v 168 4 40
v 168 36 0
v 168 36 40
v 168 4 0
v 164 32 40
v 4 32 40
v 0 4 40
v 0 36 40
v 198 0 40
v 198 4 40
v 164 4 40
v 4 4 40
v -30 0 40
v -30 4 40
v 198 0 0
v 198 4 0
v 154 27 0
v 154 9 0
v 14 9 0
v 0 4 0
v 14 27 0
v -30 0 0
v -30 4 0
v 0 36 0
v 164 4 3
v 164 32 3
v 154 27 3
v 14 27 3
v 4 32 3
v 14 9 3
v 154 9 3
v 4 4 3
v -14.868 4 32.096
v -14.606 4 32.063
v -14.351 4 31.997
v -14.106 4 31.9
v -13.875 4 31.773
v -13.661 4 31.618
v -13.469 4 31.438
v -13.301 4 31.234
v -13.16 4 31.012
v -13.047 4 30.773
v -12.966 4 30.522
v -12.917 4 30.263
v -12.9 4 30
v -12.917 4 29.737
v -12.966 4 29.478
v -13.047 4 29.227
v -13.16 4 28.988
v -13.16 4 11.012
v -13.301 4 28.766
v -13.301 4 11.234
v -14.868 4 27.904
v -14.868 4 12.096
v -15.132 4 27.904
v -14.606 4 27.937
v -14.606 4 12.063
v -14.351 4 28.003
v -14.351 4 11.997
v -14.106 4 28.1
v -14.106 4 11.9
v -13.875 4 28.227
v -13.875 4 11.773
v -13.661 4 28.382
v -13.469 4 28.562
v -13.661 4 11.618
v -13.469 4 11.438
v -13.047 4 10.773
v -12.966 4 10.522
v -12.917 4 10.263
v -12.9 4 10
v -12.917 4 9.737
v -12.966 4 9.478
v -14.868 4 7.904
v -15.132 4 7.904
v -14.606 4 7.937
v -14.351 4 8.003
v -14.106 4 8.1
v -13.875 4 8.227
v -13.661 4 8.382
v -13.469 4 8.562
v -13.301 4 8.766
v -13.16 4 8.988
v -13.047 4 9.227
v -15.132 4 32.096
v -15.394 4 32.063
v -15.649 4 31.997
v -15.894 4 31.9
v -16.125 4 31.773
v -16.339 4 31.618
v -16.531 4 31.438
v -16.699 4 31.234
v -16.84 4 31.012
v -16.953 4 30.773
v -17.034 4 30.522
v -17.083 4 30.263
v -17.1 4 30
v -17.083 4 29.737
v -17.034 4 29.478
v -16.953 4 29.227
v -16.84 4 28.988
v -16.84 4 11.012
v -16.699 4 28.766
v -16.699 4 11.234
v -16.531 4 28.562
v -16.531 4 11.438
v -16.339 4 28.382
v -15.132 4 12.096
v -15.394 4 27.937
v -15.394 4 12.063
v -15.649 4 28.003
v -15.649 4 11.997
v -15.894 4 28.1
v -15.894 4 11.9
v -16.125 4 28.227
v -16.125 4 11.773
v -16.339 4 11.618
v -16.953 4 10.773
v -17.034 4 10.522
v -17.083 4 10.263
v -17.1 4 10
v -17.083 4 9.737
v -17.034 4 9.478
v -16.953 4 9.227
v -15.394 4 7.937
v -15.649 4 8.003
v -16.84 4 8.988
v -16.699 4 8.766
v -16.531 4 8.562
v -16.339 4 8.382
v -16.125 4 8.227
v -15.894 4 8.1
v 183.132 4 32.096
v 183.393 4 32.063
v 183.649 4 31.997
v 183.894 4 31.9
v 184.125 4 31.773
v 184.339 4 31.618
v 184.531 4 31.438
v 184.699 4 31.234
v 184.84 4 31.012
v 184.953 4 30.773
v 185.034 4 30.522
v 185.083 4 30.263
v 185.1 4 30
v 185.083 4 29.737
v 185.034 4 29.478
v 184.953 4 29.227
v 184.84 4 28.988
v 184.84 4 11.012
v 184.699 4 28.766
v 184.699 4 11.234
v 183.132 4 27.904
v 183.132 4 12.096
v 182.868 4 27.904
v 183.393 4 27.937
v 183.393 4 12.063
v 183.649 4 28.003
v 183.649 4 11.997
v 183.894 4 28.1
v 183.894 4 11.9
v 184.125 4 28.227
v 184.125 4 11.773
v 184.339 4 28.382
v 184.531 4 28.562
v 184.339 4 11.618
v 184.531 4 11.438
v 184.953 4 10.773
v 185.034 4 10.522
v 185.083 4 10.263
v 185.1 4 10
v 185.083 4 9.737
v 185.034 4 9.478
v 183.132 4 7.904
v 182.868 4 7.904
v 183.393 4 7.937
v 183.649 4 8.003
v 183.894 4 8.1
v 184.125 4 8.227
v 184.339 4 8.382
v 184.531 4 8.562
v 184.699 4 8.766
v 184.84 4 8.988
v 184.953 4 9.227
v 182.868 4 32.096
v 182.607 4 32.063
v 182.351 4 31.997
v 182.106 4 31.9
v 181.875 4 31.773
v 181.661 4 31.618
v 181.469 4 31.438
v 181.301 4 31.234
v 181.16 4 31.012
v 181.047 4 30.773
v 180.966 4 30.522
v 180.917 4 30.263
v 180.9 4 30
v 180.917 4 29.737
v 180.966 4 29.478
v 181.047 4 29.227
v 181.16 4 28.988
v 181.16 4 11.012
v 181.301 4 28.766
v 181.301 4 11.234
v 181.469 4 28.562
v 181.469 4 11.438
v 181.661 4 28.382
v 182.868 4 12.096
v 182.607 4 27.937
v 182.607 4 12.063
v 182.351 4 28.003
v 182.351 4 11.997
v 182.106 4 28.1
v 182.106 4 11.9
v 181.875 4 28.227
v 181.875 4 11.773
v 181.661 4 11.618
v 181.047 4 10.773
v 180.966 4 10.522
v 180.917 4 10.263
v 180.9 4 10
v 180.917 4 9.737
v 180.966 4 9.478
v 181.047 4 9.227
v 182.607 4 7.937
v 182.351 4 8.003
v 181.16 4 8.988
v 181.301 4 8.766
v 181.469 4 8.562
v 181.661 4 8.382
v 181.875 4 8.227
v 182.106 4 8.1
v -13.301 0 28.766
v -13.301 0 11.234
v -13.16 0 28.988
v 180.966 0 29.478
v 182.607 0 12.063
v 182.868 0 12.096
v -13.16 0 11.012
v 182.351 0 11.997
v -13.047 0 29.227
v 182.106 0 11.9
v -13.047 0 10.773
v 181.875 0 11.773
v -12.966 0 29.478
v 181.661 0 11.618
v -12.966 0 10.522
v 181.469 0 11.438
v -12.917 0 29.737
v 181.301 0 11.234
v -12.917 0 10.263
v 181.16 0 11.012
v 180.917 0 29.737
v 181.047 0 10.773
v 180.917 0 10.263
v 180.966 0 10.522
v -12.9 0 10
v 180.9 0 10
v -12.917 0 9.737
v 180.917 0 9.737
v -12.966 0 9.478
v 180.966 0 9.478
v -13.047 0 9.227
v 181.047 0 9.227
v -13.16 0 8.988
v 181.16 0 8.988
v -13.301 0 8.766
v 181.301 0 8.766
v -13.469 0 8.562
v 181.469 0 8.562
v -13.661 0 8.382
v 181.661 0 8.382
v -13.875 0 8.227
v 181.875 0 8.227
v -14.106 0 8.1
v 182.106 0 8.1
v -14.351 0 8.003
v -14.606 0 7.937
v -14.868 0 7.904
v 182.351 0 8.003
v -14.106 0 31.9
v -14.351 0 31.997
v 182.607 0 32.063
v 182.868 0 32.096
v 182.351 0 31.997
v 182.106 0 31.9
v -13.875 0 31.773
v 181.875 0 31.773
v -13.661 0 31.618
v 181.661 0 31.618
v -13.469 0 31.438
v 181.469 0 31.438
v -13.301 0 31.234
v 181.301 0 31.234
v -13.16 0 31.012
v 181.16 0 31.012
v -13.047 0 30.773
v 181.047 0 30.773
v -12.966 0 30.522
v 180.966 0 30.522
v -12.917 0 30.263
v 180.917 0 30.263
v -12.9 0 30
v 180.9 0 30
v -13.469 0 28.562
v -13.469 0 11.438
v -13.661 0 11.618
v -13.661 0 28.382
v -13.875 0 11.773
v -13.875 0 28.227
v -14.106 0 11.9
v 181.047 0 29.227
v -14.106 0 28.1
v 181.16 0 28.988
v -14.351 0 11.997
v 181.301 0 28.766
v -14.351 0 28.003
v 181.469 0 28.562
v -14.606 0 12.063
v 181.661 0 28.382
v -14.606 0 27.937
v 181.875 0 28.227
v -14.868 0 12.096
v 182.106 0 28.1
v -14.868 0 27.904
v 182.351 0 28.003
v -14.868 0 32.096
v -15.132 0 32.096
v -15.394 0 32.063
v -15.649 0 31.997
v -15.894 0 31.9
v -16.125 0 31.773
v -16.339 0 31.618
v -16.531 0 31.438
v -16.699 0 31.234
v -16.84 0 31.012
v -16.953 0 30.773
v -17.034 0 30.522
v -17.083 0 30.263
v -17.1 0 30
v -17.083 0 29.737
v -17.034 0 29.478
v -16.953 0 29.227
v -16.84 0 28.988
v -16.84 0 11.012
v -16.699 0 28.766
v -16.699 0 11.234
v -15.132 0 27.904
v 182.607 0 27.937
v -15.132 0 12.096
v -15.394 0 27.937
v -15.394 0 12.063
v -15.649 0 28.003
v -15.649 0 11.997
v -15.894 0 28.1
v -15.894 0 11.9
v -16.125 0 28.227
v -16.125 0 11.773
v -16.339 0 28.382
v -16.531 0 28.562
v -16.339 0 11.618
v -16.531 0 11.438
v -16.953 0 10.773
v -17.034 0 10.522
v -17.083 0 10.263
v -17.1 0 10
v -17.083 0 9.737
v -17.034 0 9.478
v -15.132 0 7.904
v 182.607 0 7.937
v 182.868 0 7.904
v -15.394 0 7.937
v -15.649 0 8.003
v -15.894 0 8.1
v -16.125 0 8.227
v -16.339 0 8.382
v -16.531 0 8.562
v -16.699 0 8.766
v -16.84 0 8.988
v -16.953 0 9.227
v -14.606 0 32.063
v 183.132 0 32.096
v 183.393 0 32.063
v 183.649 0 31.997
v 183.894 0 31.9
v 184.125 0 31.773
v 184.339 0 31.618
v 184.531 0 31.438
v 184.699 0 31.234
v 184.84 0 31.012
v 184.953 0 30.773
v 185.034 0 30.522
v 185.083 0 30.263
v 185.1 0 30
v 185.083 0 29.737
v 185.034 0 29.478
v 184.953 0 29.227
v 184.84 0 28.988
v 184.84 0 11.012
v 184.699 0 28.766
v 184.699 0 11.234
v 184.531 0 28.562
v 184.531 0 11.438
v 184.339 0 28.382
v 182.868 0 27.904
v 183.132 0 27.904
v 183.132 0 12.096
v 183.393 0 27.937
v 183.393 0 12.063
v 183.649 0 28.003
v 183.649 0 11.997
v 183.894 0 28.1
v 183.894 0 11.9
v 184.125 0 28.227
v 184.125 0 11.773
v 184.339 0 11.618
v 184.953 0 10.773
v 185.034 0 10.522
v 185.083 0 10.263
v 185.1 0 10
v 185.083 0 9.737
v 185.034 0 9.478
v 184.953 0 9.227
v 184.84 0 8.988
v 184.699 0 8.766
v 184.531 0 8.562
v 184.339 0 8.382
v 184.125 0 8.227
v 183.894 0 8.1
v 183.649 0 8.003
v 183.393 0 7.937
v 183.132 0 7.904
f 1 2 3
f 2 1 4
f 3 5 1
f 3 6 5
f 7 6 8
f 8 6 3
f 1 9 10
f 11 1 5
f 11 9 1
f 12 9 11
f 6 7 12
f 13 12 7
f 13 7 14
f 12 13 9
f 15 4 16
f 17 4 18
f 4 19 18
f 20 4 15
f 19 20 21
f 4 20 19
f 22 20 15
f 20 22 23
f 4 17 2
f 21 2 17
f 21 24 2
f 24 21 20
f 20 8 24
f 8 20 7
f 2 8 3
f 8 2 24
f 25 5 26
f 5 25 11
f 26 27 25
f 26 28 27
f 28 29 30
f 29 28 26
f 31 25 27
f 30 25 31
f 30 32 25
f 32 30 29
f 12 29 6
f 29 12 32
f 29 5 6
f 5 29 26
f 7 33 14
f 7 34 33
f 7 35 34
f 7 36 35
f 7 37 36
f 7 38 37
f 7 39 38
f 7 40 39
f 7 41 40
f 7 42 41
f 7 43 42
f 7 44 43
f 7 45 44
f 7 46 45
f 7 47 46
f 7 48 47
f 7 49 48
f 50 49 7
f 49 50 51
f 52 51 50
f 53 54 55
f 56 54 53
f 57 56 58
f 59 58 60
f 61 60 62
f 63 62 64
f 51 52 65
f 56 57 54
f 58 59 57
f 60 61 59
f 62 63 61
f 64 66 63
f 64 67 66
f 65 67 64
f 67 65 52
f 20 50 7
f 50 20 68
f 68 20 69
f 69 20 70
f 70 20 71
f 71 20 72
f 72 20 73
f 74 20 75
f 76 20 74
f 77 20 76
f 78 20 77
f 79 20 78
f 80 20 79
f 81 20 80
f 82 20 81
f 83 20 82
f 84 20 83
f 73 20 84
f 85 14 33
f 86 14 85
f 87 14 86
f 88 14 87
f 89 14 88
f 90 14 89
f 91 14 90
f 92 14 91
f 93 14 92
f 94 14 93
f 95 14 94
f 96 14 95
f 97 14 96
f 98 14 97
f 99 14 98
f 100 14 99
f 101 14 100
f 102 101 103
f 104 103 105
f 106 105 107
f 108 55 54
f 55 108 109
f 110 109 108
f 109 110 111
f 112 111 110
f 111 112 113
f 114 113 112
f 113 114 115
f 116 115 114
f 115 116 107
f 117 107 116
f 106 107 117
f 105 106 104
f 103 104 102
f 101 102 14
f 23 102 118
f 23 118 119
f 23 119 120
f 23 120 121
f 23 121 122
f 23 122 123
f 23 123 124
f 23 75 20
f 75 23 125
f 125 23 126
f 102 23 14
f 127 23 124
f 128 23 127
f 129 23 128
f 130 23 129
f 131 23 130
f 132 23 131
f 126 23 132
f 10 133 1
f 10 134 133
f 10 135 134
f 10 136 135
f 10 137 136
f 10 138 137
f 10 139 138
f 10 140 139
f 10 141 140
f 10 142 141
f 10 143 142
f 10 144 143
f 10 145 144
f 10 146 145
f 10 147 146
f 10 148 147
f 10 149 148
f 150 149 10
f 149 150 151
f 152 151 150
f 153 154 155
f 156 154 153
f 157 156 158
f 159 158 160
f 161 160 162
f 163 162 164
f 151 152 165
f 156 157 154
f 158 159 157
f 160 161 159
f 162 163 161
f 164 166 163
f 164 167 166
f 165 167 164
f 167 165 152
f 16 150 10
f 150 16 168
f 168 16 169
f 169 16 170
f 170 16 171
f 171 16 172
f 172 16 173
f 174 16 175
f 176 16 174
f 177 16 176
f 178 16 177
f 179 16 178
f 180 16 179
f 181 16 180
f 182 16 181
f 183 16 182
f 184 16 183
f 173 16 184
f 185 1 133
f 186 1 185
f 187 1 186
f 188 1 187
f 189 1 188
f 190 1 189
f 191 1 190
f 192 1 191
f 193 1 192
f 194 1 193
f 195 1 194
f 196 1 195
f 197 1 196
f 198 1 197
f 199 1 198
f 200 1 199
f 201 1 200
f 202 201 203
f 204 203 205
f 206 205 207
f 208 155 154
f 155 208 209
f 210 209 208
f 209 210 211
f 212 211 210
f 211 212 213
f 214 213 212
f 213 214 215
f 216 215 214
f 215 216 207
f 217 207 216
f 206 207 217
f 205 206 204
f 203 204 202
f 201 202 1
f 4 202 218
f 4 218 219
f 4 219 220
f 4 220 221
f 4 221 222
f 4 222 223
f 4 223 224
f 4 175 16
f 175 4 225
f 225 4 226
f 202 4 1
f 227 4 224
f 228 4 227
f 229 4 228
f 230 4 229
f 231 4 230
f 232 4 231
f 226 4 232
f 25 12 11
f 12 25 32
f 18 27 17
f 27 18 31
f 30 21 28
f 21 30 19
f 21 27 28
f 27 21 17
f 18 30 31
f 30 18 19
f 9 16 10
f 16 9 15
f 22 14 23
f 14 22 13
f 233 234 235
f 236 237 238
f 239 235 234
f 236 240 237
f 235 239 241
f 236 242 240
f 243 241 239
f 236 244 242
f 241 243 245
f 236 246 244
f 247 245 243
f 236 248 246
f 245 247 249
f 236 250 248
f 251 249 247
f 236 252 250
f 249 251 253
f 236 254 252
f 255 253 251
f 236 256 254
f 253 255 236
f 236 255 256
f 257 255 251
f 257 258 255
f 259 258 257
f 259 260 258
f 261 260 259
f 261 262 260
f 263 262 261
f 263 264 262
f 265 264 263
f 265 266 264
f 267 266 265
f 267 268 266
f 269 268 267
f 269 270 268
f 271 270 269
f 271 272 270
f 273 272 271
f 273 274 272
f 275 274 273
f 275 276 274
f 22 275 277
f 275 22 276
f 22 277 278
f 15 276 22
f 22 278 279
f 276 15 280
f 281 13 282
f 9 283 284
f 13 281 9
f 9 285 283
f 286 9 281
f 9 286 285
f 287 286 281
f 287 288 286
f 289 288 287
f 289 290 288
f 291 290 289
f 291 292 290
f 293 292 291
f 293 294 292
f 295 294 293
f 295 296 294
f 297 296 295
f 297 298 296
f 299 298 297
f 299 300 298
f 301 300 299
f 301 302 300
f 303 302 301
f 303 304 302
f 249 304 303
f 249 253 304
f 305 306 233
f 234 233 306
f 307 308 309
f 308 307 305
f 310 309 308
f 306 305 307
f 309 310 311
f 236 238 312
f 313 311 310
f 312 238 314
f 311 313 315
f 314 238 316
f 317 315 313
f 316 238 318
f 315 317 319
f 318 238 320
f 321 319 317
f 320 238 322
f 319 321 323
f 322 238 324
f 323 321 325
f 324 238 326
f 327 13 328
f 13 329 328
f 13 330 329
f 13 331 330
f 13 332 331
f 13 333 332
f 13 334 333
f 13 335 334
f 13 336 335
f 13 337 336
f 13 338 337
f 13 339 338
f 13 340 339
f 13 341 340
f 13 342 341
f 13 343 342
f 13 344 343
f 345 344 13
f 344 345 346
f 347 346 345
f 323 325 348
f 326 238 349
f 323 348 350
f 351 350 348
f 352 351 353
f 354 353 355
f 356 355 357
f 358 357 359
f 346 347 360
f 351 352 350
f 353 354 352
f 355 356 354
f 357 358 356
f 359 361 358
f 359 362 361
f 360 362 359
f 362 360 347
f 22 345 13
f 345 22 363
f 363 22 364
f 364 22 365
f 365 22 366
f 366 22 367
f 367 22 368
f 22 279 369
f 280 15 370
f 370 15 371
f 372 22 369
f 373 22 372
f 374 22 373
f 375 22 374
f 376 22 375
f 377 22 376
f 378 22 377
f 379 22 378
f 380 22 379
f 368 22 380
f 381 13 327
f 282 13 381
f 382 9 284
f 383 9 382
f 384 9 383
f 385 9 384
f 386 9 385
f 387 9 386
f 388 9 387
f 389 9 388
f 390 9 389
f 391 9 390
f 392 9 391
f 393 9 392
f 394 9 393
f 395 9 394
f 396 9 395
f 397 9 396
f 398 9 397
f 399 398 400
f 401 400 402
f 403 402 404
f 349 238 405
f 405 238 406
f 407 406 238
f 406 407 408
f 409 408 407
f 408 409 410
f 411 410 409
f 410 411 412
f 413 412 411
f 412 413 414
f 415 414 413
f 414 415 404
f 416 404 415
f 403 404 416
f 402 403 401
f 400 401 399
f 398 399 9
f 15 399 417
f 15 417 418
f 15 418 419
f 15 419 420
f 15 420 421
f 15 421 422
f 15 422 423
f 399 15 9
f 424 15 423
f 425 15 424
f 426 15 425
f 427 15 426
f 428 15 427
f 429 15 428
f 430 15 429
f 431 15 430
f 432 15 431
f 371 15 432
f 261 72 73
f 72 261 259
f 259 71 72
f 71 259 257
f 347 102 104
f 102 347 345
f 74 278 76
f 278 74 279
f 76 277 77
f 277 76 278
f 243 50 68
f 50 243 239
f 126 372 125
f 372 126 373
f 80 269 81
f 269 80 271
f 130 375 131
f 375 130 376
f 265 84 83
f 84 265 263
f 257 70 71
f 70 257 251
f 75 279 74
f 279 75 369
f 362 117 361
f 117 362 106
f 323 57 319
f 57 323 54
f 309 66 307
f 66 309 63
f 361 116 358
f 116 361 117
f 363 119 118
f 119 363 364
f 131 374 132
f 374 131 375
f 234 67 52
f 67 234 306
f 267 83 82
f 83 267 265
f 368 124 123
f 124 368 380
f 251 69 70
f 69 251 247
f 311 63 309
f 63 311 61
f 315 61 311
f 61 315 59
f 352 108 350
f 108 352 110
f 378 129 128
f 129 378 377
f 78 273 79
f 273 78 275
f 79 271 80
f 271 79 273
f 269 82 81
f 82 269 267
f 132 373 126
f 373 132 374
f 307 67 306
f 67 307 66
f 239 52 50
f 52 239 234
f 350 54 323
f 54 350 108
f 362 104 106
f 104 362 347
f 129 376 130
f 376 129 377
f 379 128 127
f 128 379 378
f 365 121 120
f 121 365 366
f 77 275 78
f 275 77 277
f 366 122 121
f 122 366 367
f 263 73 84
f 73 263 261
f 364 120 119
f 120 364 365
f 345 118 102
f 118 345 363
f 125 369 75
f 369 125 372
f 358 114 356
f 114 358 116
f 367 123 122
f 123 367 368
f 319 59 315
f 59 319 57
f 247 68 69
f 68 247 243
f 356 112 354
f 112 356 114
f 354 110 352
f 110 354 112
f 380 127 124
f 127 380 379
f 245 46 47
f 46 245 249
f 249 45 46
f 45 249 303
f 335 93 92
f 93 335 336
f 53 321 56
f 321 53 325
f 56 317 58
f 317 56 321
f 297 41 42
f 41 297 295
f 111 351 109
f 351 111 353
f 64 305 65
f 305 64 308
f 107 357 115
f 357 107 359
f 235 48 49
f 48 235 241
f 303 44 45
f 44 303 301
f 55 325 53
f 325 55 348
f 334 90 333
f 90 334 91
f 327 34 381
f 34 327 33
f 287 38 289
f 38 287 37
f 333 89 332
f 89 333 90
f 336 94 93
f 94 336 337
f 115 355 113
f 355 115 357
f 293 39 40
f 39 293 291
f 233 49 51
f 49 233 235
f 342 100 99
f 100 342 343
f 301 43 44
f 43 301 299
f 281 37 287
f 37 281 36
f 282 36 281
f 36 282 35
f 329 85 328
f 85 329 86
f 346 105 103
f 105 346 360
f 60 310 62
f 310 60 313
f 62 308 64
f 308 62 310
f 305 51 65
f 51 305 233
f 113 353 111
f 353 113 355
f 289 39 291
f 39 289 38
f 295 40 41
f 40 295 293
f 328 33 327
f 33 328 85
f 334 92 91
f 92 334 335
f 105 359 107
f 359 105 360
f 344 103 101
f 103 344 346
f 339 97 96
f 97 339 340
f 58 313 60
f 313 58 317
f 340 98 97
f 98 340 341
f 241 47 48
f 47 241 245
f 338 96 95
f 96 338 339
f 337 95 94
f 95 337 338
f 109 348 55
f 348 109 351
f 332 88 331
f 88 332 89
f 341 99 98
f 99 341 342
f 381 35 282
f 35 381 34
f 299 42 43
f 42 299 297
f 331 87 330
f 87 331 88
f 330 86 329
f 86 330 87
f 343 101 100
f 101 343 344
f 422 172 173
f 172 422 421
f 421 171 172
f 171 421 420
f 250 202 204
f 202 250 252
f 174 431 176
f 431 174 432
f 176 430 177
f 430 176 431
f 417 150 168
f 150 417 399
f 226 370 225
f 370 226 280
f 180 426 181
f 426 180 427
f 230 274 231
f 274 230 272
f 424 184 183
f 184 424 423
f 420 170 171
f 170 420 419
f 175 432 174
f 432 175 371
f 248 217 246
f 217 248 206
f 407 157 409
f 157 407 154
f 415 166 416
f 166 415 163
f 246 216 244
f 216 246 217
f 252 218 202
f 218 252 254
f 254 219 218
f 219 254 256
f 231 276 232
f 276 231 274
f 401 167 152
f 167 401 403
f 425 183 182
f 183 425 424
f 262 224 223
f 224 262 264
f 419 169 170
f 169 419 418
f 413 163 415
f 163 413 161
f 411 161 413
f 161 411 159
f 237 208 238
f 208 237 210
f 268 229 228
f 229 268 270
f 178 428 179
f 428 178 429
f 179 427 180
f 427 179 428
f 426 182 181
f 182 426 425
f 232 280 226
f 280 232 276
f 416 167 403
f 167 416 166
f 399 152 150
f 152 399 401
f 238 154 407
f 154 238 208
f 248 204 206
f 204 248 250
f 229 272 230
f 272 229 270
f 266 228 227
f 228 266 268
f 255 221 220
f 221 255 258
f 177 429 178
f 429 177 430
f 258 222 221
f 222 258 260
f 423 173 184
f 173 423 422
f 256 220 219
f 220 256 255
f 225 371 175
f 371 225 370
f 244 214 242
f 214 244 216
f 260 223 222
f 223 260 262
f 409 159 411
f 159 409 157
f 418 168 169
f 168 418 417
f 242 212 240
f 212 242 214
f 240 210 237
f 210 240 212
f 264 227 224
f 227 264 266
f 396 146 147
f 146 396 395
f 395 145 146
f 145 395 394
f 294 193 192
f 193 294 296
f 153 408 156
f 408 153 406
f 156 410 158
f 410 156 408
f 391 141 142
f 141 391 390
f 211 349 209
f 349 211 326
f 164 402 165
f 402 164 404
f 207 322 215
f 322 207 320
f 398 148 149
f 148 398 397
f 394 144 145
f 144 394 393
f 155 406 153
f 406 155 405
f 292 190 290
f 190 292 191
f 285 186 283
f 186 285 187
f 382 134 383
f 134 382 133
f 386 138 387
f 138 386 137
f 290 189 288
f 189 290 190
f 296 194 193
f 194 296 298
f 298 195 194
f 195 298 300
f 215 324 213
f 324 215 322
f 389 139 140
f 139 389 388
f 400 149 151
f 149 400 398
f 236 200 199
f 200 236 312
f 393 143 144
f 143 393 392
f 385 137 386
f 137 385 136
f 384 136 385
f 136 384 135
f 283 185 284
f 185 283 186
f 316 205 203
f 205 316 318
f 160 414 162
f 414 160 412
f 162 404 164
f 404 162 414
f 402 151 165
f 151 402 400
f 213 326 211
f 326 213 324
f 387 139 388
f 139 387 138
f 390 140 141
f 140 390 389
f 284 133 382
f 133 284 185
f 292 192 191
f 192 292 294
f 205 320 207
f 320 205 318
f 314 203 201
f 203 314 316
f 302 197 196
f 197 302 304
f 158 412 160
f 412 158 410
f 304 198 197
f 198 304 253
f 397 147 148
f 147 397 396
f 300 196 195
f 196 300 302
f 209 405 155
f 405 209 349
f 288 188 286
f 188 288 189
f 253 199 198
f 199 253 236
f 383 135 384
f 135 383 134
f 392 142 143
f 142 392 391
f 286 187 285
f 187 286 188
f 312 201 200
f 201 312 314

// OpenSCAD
// --- Parameters ---
inner_length = 160;       // Internal length of the box
inner_width = 28;         // Internal width of the box
wall_thickness = 4;       // Thickness of the outer walls
wall_height = 40;         // Height of the box walls
backplate_height = 40;    // Independent height of the back mounting plate
overhang = 30;            // Extension of the mounting ears at the back

// --- Support Rim Parameters (The Stop) ---
support_rim_base = 5;     // Standard width of the support rim (front/back/sides)
support_height = 3;       // Thickness/height of the rim on the Z-axis

extra_support_left = 5;   // Extra width for the left support rim
extra_support_right = 5;  // Extra width for the right support rim

hole_diameter = 4.2;      // Diameter of the mounting holes
hole_distance_z = 10;     // Vertical distance of holes from top and bottom edge

// --- Calculations ---
outer_length = inner_length + (2 * wall_thickness);
outer_width = inner_width + (2 * wall_thickness);
backplate_length = outer_length + (2 * overhang);

total_support_left = support_rim_base + extra_support_left;
total_support_right = support_rim_base + extra_support_right;

// --- Model ---
difference() {
    union() {
        // 1. Backplate
        translate([-overhang, 0, 0])
            cube([backplate_length, wall_thickness, backplate_height]);

        // 2. Box Walls
        difference() {
            cube([outer_length, outer_width, wall_height]);

            // Main cavity
            translate([wall_thickness, wall_thickness, support_height])
                cube([inner_length, inner_width, wall_height + 1]);

            // Bottom opening (Pass-through)
            translate([wall_thickness + total_support_left, wall_thickness + support_rim_base, -1])
                cube([inner_length - total_support_left - total_support_right, 
                      inner_width - (2 * support_rim_base), 
                      support_height + 2]);

            // Clear back wall area for backplate integration
            translate([-1, -1, -1])
                cube([outer_length + 2, wall_thickness + 1, max(wall_height, backplate_height) + 2]);
        }
    }

    // 3. Screw Holes
    union() {
        // Left holes
        translate([-overhang/2, -1, hole_distance_z])
            rotate([-90, 0, 0]) cylinder(d=hole_diameter, h=wall_thickness + 2, $fn=50);
        translate([-overhang/2, -1, backplate_height - hole_distance_z])
            rotate([-90, 0, 0]) cylinder(d=hole_diameter, h=wall_thickness + 2, $fn=50);

        // Right holes
        translate([outer_length + overhang/2, -1, hole_distance_z])
            rotate([-90, 0, 0]) cylinder(d=hole_diameter, h=wall_thickness + 2, $fn=50);
        translate([outer_length + overhang/2, -1, backplate_height - hole_distance_z])
            rotate([-90, 0, 0]) cylinder(d=hole_diameter, h=wall_thickness + 2, $fn=50);
    }
}
